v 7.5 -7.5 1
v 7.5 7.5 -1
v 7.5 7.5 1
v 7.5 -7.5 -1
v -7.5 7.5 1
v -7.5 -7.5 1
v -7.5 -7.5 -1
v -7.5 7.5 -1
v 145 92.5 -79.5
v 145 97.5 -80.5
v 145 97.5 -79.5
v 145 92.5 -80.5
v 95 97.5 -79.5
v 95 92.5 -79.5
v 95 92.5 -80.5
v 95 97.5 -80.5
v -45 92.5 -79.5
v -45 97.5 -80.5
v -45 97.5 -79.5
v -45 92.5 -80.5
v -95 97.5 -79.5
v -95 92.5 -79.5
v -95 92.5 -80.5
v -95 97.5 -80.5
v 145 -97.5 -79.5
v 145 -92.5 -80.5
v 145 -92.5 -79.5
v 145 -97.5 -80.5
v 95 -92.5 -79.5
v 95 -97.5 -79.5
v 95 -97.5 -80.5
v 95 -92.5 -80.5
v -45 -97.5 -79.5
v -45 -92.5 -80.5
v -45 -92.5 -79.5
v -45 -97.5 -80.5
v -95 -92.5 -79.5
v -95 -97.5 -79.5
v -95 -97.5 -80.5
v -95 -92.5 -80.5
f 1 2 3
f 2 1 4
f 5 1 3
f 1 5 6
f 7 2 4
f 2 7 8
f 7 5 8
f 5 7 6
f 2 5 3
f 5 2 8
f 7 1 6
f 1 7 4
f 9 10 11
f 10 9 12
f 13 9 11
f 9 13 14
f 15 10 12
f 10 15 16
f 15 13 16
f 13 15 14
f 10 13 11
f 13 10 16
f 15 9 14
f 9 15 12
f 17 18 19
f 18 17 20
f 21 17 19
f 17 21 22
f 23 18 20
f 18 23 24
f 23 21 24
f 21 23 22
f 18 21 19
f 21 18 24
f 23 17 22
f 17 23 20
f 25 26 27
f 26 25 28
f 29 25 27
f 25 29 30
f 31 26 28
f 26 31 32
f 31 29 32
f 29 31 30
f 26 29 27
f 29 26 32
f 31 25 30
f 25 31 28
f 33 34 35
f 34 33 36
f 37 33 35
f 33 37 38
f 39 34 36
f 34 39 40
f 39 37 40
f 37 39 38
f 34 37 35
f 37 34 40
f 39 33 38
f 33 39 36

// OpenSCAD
// file: single_leg.scad
include<colors.scad>;
include<parameters.scad>;
include<for_diagrams.scad>;



x = 80+20*$t;
y = 10-50*$t;
z = 90-20*$t;

i = sqrt(x*x + y*y);
u = i - L1;
n = sqrt((u)*(u) + z*z);
a1 = acos((z*z+n*n-u*u) / (2*z*n));
a2 = acos((n*n+L2*L2-L3*L3) / (2*n*L2));

alpha = atan(x/y);
beta = a1 + a2;
gamma = acos((L2*L2+L3*L3-n*n) / (2*L2*L3));

echo("alpha: ", alpha);
echo("beta: ", beta);
echo("gamma: ", gamma);

distance_x(red);
distance_y(green);
distance_z(blue);
distance_i();
distance_n(grey);
if(y<0)
	single_leg([alpha+180,beta,gamma], brown, purple, orange);
else
	single_leg([alpha,beta,gamma], brown, purple, orange);



module single_leg(angles, color1, color2, color3) {
    rotate([0,0,90-angles[0]]) {
        leg_part(L1, color1, "L", "1");                      // leg part 1
        translate([L1,0,0]) rotate([0,90-angles[1],0]) {
            leg_part(L2, color2, "L", "2");                  // leg part 2
            translate([L2,0,0]) rotate([0,180-angles[2],0]) {
                leg_part(L3, color3, "L", "3");              // leg part 3
            }
        }
    }
}

module leg_part(length, color, label1, label2) {
    translate([length/2, 0, 0]) color(color) 
    if (SHOW_LABEL) 
        d_length_t2(length, label1, label2); 
    else 
        cube([length, 1, 1], true);
}

module distance_x(color) {
    translate([(x)/2,y,-z]) rotate([0,0,0]) color(color)
    d_length_t1(x,"X");
}
module distance_y(color) {
    translate([0,y/2,-z]) rotate([0,0,90]) color(color)
    d_length_t1(y,"Y");
}
module distance_z(color){
    translate([0,0,-z/2]) rotate([0,-90,90]) color(color)
    d_length_t1(z,"Z");
}
module distance_i(color){
    rotate([0,0,90-alpha]) translate([(i)/2,0,-z]) color(color)
    d_length_t1(i,"u");
}
module distance_n(color){
    rotate([0,0,90-alpha]) translate([L1,0,0]) rotate([0,90-a1,0]) translate([n/2,0,0]) rotate([90,0,0]) color(color)
    d_length_t1(n,"n");
}
// file: for_diagrams.scad
include<bitmap.scad>;

scale=1;
res=50;

module d_vector(length, label){
	union(){
		cube([length,scale,1],center=true);
		translate([length/2,0,0]){
			rotate([0,0,45])cube([scale,scale,1],center=true);
			rotate([0,0,45])translate([-scale*3/2,0,0])cube([scale*3,scale,1],center=true);
			rotate([0,0,-45])translate([-scale*3/2,0,0])cube([scale*3,scale,1],center=true);
		}
		translate([-length/2,0,0]){
			cylinder(r=scale,h=1,center=true,$fn=res);
		}
		rotate([0,0,-90])
			translate([-scale*2-scale,-scale*2,0])
				8bit_str(["v",label], 2, scale, 1);
	}
}

module d_length_t1(length, label1){
	union(){
		cube([length,scale,1],center=true);
		translate([length/2,0,0]){
			cube([scale,scale*6,1],center=true);
		}
		translate([-length/2,0,0]){
			cube([scale,scale*6,1],center=true);
		}
		rotate([0,0,-90])
			translate([-scale*6,0,0])
				8bit_str([label1], 1, scale, 1);
	}
}

module d_length_t2(length, label1, label2){
	union(){
		cube([length,scale,1],center=true);
		translate([length/2,0,0]){
			cube([scale,scale*6,1],center=true);
		}
		translate([-length/2,0,0]){
			cube([scale,scale*6,1],center=true);
		}
		rotate([0,0,-90])
			translate([-scale*6,-scale*2,0])
				8bit_str([label1, label2], 2, scale, 1);
	}
}

//todo: Can only do 0-180 degrees. Extend to 360.
module d_angle(a,r,dir,label){
	union(){
		difference(){
			cylinder(r=r+scale/2,h=1,center=true,$fn=res);
			cylinder(r=r-scale/2,h=2,center=true,$fn=res);
			translate([0,-((r+scale/2)+1)/2,0])cube([(r+scale/2)*2+1, (r+scale/2)+1, 2],center=true);
			rotate([0,0,a])translate([0,((r+scale/2)+1)/2,0])
				cube([(r+scale/2)*2+1, (r+scale/2)+1, 2],center=true);
			if(dir==1){
				translate([(r)*cos(a),(r)*sin(a),0])rotate([0,0,a+90])
					translate([-scale/2+0.1,0,0])cube([scale,scale+1,2],center=true);
			}
			else{
				translate([r,0,0])
					translate([0,scale/2+0.1,0])cube([scale+1,scale+1,2],center=true);
			}
		}
		if(dir==1){
			translate([r,0,0])cylinder(r=scale*1.5,h=1,center=true,$fn=res);
			translate([(r)*cos(a),(r)*sin(a),0])rotate([0,0,a+90]){
				rotate([0,0,45])translate([-scale/2,scale/2,0])cube([scale,scale,1],center=true);
				rotate([0,0,45])translate([-scale*6/2,scale/2,0])cube([scale*6,scale,1],center=true);
				rotate([0,0,-45])translate([-scale*6/2,-scale/2,0])cube([scale*6,scale,1],center=true);
			}
		}
		else{
			translate([(r)*cos(a),(r)*sin(a),0])cylinder(r=scale*1.5,h=1,center=true,$fn=res);
			translate([r,0,0])rotate([0,0,-90]){
				rotate([0,0,45])translate([-scale/2,scale/2,0])cube([scale,scale,1],center=true);
				rotate([0,0,45])translate([-scale*6/2,scale/2,0])cube([scale*6,scale,1],center=true);
				rotate([0,0,-45])translate([-scale*6/2,-scale/2,0])cube([scale*6,scale,1],center=true);
			}
		}
		rotate([0,0,a/2-180])
			translate([-scale*8-r,-scale*2,0])
				8bit_str(["a",label], 2, scale, 1);
		translate([r/2,0,0])cube([r,1,1],center=true);
		rotate([0,0,a])translate([r/2,0,0])cube([r,1,1],center=true);
	}
}
// file: parameters.scad
/**
 * Robot Parameters File
 */

SHOW_LABEL = true;

center_offset = 33;   // distance from the center of robot and the first servo axis
L1 = 45;              // distance from the first servo axis and the second servo axis
L2 = 46.8;            // distance from the second servo axis and the third servo axis
L3 = 103.5;           // distance from the third servo axis and the tip of the leg
// file: colors.scad
/**
 * Color Resource File
 */

red = [1,0,0];
cyan = [0,1,1];
blue = [0,0,1];
blue_dark = [0,0,160/255];
blue_light = [173/255,216/255,230/255];
purple = [128/255,0,128/255];
yellow = [1,1,0];
lime = [0,1,0];
magenta = [1,0,1];
white = [1,1,1];
silver = [192/255,192/255,192/255];
grey = [128/255,128/255,128/255];
black = [0,0,0];
orange = [1,128/255,64/255];
brown = [165/255,42/255,42/255];
maroon = [128/255,0,0];
green = [0,128/255,0];
olive = [128/255,128/255,0];
// file: four_legs.scad
include<colors.scad>;
include<parameters.scad>;
include<for_diagrams.scad>;
use<single_leg.scad>;

X_DEFAULT = 95;
Y_DEFAULT = 95;
Z_DEFAULT = 80;

// Positions of the tips of the legs.
// leg 1
x1 = X_DEFAULT+0*$t;
y1 = Y_DEFAULT+0*$t;
z1 = Z_DEFAULT+0*$t;
// leg 2
x2 = -X_DEFAULT-0*$t;
y2 = Y_DEFAULT+0*$t;
z2 = Z_DEFAULT+0*$t;
// leg 3
x3 = -X_DEFAULT-0*$t;
y3 = -Y_DEFAULT-0*$t;
z3 = Z_DEFAULT+0*$t;
// leg 4
x4 = X_DEFAULT+0*$t;
y4 = -Y_DEFAULT-0*$t;
z4 = Z_DEFAULT-0*$t;

center_x = 10;
center_y = 0;
center_z = 0;
theta = 20+40*$t;
phi = 0;

four_legs(x1,y1,z1, x2,y2,z2, x3,y3,z3, x4,y4,z4, center_x,center_y,center_z, theta,phi);


module four_legs(x1,y1,z1, x2,y2,z2, x3,y3,z3, x4,y4,z4, center_x=0,center_y=0,center_z=0, theta=0, phi=0) {
   
    color([0,0,0]) translate([center_x,center_y,center_z]) rotate([0,0,theta+45]) cube([75,1,1], true);
    color([0,0,0]) translate([center_x,center_y,center_z]) rotate([0,0,theta+135]) cube([75,1,1], true);
    translate([center_x,center_y,center_z]) rotate([0,-phi,theta]) cube([15,15,2], true);

    x1_offset = x1 - sqrt(center_offset*center_offset/2) - center_x;
    y1_offset = y1 - sqrt(center_offset*center_offset/2) - center_y;
    z1_offset = z1 + center_z;

    x2_offset = x2 + sqrt(center_offset*center_offset/2) - center_x;
    y2_offset = y2 - sqrt(center_offset*center_offset/2) - center_y;
    z2_offset = z2+center_z;

    x3_offset = x3 + sqrt(center_offset*center_offset/2) - center_x;
    y3_offset = y3 + sqrt(center_offset*center_offset/2) - center_y;
    z3_offset = z3 + center_z;

    x4_offset = x4 - sqrt(center_offset*center_offset/2) - center_x;
    y4_offset = y4 + sqrt(center_offset*center_offset/2) - center_y;
    z4_offset = z4 + center_z;

    chord = 2*sqrt(x1*x1+y1*y1)*sin(theta/2);

    x_leg1 = cal_x_prime(x1_offset,y1_offset,45) - chord*sin(theta/2);
    y_leg1 = cal_y_prime(x1_offset,y1_offset,45) - chord*cos(theta/2);
    z_leg1 = z1_offset;

    x_leg2 = cal_x_prime(x2_offset,y2_offset,135) - chord*sin(theta/2);
    y_leg2 = cal_y_prime(x2_offset,y2_offset,135) - chord*cos(theta/2);
    z_leg2 = z2_offset;

    x_leg3 = cal_x_prime(x3_offset,y3_offset,225) - chord*sin(theta/2);
    y_leg3 = cal_y_prime(x3_offset,y3_offset,225) - chord*cos(theta/2);
    z_leg3 = z3_offset;

    x_leg4 = cal_x_prime(x4_offset,y4_offset,315) - chord*sin(theta/2);
    y_leg4 = cal_y_prime(x4_offset,y4_offset,315) - chord*cos(theta/2);
    z_leg4 = z4_offset;

    u_leg1 = sqrt(x_leg1*x_leg1 + y_leg1*y_leg1);
    n_leg1 = sqrt((u_leg1-L1)*(u_leg1-L1) + z_leg1*z_leg1);
    a1_leg1 = acos((z_leg1*z_leg1+n_leg1*n_leg1-(u_leg1-L1)*(u_leg1-L1)) / (2*z_leg1*n_leg1));
    a2_leg1 = acos((n_leg1*n_leg1+L2*L2-L3*L3) / (2*n_leg1*L2));
    a3_leg1 = acos((L2*L2+L3*L3-n_leg1*n_leg1) / (2*L2*L3));

    u_leg2 = sqrt(x_leg2*x_leg2 + y_leg2*y_leg2);
    n_leg2 = sqrt((u_leg2-L1)*(u_leg2-L1) + z_leg2*z_leg2);
    a1_leg2 = acos((z_leg2*z_leg2+n_leg2*n_leg2-(u_leg2-L1)*(u_leg2-L1)) / (2*z_leg2*n_leg2));
    a2_leg2 = acos((n_leg2*n_leg2+L2*L2-L3*L3) / (2*n_leg2*L2));
    a3_leg2 = acos((L2*L2+L3*L3-n_leg2*n_leg2) / (2*L2*L3));

    u_leg3 = sqrt(x_leg3*x_leg3 + y_leg3*y_leg3);
    n_leg3 = sqrt((u_leg3-L1)*(u_leg3-L1) + z_leg3*z_leg3);
    a1_leg3 = acos((z_leg3*z_leg3+n_leg3*n_leg3-(u_leg3-L1)*(u_leg3-L1)) / (2*z_leg3*n_leg3));
    a2_leg3 = acos((n_leg3*n_leg3+L2*L2-L3*L3) / (2*n_leg3*L2));
    a3_leg3 = acos((L2*L2+L3*L3-n_leg3*n_leg3) / (2*L2*L3));

    u_leg4 = sqrt(x_leg4*x_leg4 + y_leg4*y_leg4);
    n_leg4 = sqrt((u_leg4-L1)*(u_leg4-L1) + z_leg4*z_leg4);
    a1_leg4 = acos((z_leg4*z_leg4+n_leg4*n_leg4-(u_leg4-L1)*(u_leg4-L1)) / (2*z_leg4*n_leg4));
    a2_leg4 = acos((n_leg4*n_leg4+L2*L2-L3*L3) / (2*n_leg4*L2));
    a3_leg4 = acos((L2*L2+L3*L3-n_leg4*n_leg4) / (2*L2*L3));

    a11 = atan(x_leg1/y_leg1);
    a12 = a1_leg1 + a2_leg1;
    a13 = a3_leg1;

	echo("a11: ", a21);
	echo("a12: ", a22);
	echo("a13: ", a23);

    a21 = atan(x_leg2/y_leg2);
    a22 = a1_leg2 + a2_leg2;
    a23 = a3_leg2;

    a31 = atan(x_leg3/y_leg3);
    a32 = a1_leg3 + a2_leg3;
    a33 = a3_leg3;

    a41 = atan(x_leg4/y_leg4);
    a42 = a1_leg4 + a2_leg4;
    a43 = a3_leg4;

    translate([center_x,center_y,center_z]) {
        rotate([0,0,45+theta]) translate([center_offset,0,0]) 
		   if(y_leg1 < 0)
                single_leg([a11+180,a12,a13], lime, lime, lime);          // leg 1
            else
                single_leg([a11,a12,a13], lime, lime, lime);              // leg 1
        rotate([0,0,135+theta]) translate([center_offset,0,0]) 
		   if(y_leg2 < 0)
	            single_leg([a21+180,a22,a23], blue, blue, blue);          // leg 2
            else
	            single_leg([a21,a22,a23], blue, blue, blue);              // leg 2
        rotate([0,0,225+theta]) translate([center_offset,0,0]) 
		   if(y_leg3 < 0)
                single_leg([a31+180,a32,a33], purple, purple, purple);    // leg 3
            else
                single_leg([a31,a32,a33], purple, purple, purple);        // leg 3
        rotate([0,0,315+theta]) translate([center_offset,0,0]) 
		   if(y_leg4 < 0)
                single_leg([a41+180,a42,a43], orange, orange, orange);    // leg 4
            else
                single_leg([a41,a42,a43], orange, orange, orange);        // leg 4
    }
}

// Planar rotation (x -> x')
function cal_x_prime(x,y,angle) = x*cos(angle) + y*sin(angle);
function cal_y_prime(x,y,angle) = -x*sin(angle) + y*cos(angle);
// Planar rotation (x' -> x)
function cal_x(x_prime,y_prime,angle) = x_prime*cos(angle) - y_prime*sin(angle);
function cal_y(x_prime,y_prime,angle) = x_prime*sin(angle) + y_prime*cos(angle);
// main file
use<four_legs.scad>;

X_DEFAULT = 95;
Y_DEFAULT = 95;
Z_DEFAULT = 80;

direction = 0;
distance = 50;

walk(direction, distance);
translate([95+distance/2,95,-Z_DEFAULT]) cube([distance,5,1], true);
translate([-95+distance/2,95,-Z_DEFAULT]) cube([distance,5,1], true);
translate([95+distance/2,-95,-Z_DEFAULT]) cube([distance,5,1], true);
translate([-95+distance/2,-95,-Z_DEFAULT]) cube([distance,5,1], true);



/**
 * Walking routine. Thi is a sinusoidal gait which takes a direction and a distance as inputs. 
 * - If the distance is below the WALK_THRESHOLD only the body moves, no walking.
 * - One leg at a time is up.
 * - The robot's center of mass should be as close as possible to center of the triangle formed by the three other legs.
 * - The lifted leg sequence depends on the orientation:
 *     - <315;45>  -> 1,2,3,4
 *     - <45;135>  -> 2,3,4,1
 *     - <135;225> -> 3,4,1,2
 *     - <225;315> -> 4,1,2,3
 */
module walk(direction, distance) {
    WALK_THRESHOLD = 45;
    GAIT_AMPLITUDE = 50;
    LEG_Z_LIFT = 15;
    STEPS = 4;

    if(distance <= WALK_THRESHOLD) {
        assign (i = distance*cos(direction), 
                j = distance*sin(direction),
                k = 0,
                x1 = X_DEFAULT,y1 = Y_DEFAULT,z1 = Z_DEFAULT,
                x2 = -X_DEFAULT,y2 = Y_DEFAULT,z2 = Z_DEFAULT,
                x3 = -X_DEFAULT,y3 = -Y_DEFAULT,z3 = Z_DEFAULT,
                x4 = X_DEFAULT,y4 = -Y_DEFAULT,z4 = Z_DEFAULT) {
            translate([i,j,k]) cube([15,15,2], true);
            four_legs(x1,y1,z1, x2,y2,z2, x3,y3,z3, x4,y4,z4, i,j,k);
        }
    }
    else {
        assign (i = distance*cos(direction)*$t+cal_x($t, GAIT_AMPLITUDE*sin(360*$t+180), direction), 
                j = distance*sin(direction)*$t+cal_y($t, GAIT_AMPLITUDE*sin(360*$t+180), direction),
                k = 0) {
            translate([i,j,k]) cube([15,15,2], true);
            if(direction >= -45 && direction < 45) {    // 2,1,3,4
	            if($t > 0 && $t <= 1/STEPS) {
	                assign (
	                        x1 = X_DEFAULT,y1 = Y_DEFAULT,z1 = Z_DEFAULT,
	
	                        x2 = -X_DEFAULT+distance*cos(direction)*$t*STEPS,
	                        y2 = Y_DEFAULT+distance*sin(direction)*$t*STEPS,
	                        z2 = Z_DEFAULT-LEG_Z_LIFT*sin(180*$t*STEPS),
	
	                        x3 = -X_DEFAULT,y3 = -Y_DEFAULT,z3 = Z_DEFAULT,
	
	                        x4 = X_DEFAULT,y4 = -Y_DEFAULT,z4 = Z_DEFAULT) {
	                    four_legs(x1,y1,z1, x2,y2,z2, x3,y3,z3, x4,y4,z4, i,j,k);
	                }
	            } else if($t > 1/STEPS && $t <= 2/STEPS) {
	                assign (
	                        x1 = X_DEFAULT+distance*cos(direction)*($t-1/STEPS)*STEPS,
	                        y1 = Y_DEFAULT+distance*sin(direction)*($t-1/STEPS)*STEPS,
	                        z1 = Z_DEFAULT+LEG_Z_LIFT*sin(180*$t*STEPS),
	
	                        x2 = -X_DEFAULT+distance*cos(direction),
	                        y2 = Y_DEFAULT+distance*sin(direction),
	                        z2 = Z_DEFAULT,
	
	                        x3 = -X_DEFAULT,y3 = -Y_DEFAULT,z3 = Z_DEFAULT,
	
	                        x4 = X_DEFAULT,y4 = -Y_DEFAULT,z4 = Z_DEFAULT) {
	                    four_legs(x1,y1,z1, x2,y2,z2, x3,y3,z3, x4,y4,z4, i,j,k);
	                }
	            } else if($t > 2/STEPS && $t <= 3/STEPS) {
	                assign (
	                        x1 = X_DEFAULT+distance*cos(direction),
	                        y1 = Y_DEFAULT+distance*sin(direction),
	                        z1 = Z_DEFAULT,
	
	                        x2 = -X_DEFAULT+distance*cos(direction),
	                        y2 = Y_DEFAULT+distance*sin(direction),
	                        z2 = Z_DEFAULT,
	
	                        x3 = -X_DEFAULT+distance*cos(direction)*($t-2/STEPS)*STEPS,
	                        y3 = -Y_DEFAULT+distance*sin(direction)*($t-2/STEPS)*STEPS,
	                        z3 = Z_DEFAULT-LEG_Z_LIFT*sin(180*$t*STEPS),
	
	                        x4 = X_DEFAULT,y4 = -Y_DEFAULT,z4 = Z_DEFAULT) {
	                    four_legs(x1,y1,z1, x2,y2,z2, x3,y3,z3, x4,y4,z4, i,j,k);
	                }
	            } else if($t > 3/STEPS && $t <= 4/STEPS) {
	                assign (
	                        x1 = X_DEFAULT+distance*cos(direction),
	                        y1 = Y_DEFAULT+distance*sin(direction),
	                        z1 = Z_DEFAULT,
	
	                        x2 = -X_DEFAULT+distance*cos(direction),
	                        y2 = Y_DEFAULT+distance*sin(direction),
	                        z2 = Z_DEFAULT,
	
	                        x3 = -X_DEFAULT+distance*cos(direction),
	                        y3 = -Y_DEFAULT+distance*sin(direction),
	                        z3 = Z_DEFAULT,
	
	                        x4 = X_DEFAULT+distance*cos(direction)*($t-3/STEPS)*STEPS,
	                        y4 = -Y_DEFAULT+distance*sin(direction)*($t-3/STEPS)*STEPS,
	                        z4 = Z_DEFAULT+LEG_Z_LIFT*sin(180*$t*STEPS)) {
	                    four_legs(x1,y1,z1, x2,y2,z2, x3,y3,z3, x4,y4,z4, i,j,k);
	                }
	            }
            } else if(direction >= 45 && direction < 135) {    // 3,2,4,1
	            if($t > 0 && $t <= 1/STEPS) {
	                assign (
	                        x1 = X_DEFAULT,y1 = Y_DEFAULT,z1 = Z_DEFAULT,
	
	                        x2 = -X_DEFAULT,y2 = Y_DEFAULT,z2 = Z_DEFAULT,
	
	                        x3 = -X_DEFAULT+distance*cos(direction)*$t*STEPS,
	                        y3 = -Y_DEFAULT+distance*sin(direction)*$t*STEPS,
	                        z3 = Z_DEFAULT-LEG_Z_LIFT*sin(180*$t*STEPS),
	
	                        x4 = X_DEFAULT,y4 = -Y_DEFAULT,z4 = Z_DEFAULT) {
	                    four_legs(x1,y1,z1, x2,y2,z2, x3,y3,z3, x4,y4,z4, i,j,k);
	                }
	            } else if($t > 1/STEPS && $t <= 2/STEPS) {
	                assign (
	                        x1 = X_DEFAULT,y1 = Y_DEFAULT,z1 = Z_DEFAULT,
	
	                        x2 = -X_DEFAULT+distance*cos(direction)*($t-1/STEPS)*STEPS,
	                        y2 = Y_DEFAULT+distance*sin(direction)*($t-1/STEPS)*STEPS,
	                        z2 = Z_DEFAULT+LEG_Z_LIFT*sin(180*$t*STEPS),
	
	                        x3 = -X_DEFAULT+distance*cos(direction),
	                        y3 = -Y_DEFAULT+distance*sin(direction),
	                        z3 = Z_DEFAULT,
	
	                        x4 = X_DEFAULT,y4 = -Y_DEFAULT,z4 = Z_DEFAULT) {
	                    four_legs(x1,y1,z1, x2,y2,z2, x3,y3,z3, x4,y4,z4, i,j,k);
	                }
	            } else if($t > 2/STEPS && $t <= 3/STEPS) {
	                assign (
	                        x1 = X_DEFAULT,y1 = Y_DEFAULT,z1 = Z_DEFAULT,
	
	                        x2 = -X_DEFAULT+distance*cos(direction),
	                        y2 = Y_DEFAULT+distance*sin(direction),
	                        z2 = Z_DEFAULT,
	
	                        x3 = -X_DEFAULT+distance*cos(direction),
	                        y3 = -Y_DEFAULT+distance*sin(direction),
	                        z3 = Z_DEFAULT,
	
	                        x4 = X_DEFAULT+distance*cos(direction)*($t-2/STEPS)*STEPS,
	                        y4 = -Y_DEFAULT+distance*sin(direction)*($t-2/STEPS)*STEPS,
	                        z4 = Z_DEFAULT-LEG_Z_LIFT*sin(180*$t*STEPS)) {
	                    four_legs(x1,y1,z1, x2,y2,z2, x3,y3,z3, x4,y4,z4, i,j,k);
	                }
	            } else if($t > 3/STEPS && $t <= 4/STEPS) {
	                assign (
	                        x1 = X_DEFAULT+distance*cos(direction)*($t-3/STEPS)*STEPS,
	                        y1 = Y_DEFAULT+distance*sin(direction)*($t-3/STEPS)*STEPS,
	                        z1 = Z_DEFAULT+LEG_Z_LIFT*sin(180*$t*STEPS),
	
	                        x2 = -X_DEFAULT+distance*cos(direction),
	                        y2 = Y_DEFAULT+distance*sin(direction),
	                        z2 = Z_DEFAULT,
	
	                        x3 = -X_DEFAULT+distance*cos(direction),
	                        y3 = -Y_DEFAULT+distance*sin(direction),
	                        z3 = Z_DEFAULT,
	
	                        x4 = X_DEFAULT+distance*cos(direction),
	                        y4 = -Y_DEFAULT+distance*sin(direction),
	                        z4 = Z_DEFAULT) {
	                    four_legs(x1,y1,z1, x2,y2,z2, x3,y3,z3, x4,y4,z4, i,j,k);
	                }
	            }
            } else if(direction >= 135 && direction < 225) {    // 4,3,1,2
                if($t > 0 && $t <= 1/STEPS) {
	                assign (
	                        x1 = X_DEFAULT,y1 = Y_DEFAULT,z1 = Z_DEFAULT,
	
	                        x2 = -X_DEFAULT,y2 = Y_DEFAULT,z2 = Z_DEFAULT,
	
	                        x3 = -X_DEFAULT+distance*cos(direction)*$t*STEPS,
	                        y3 = -Y_DEFAULT+distance*sin(direction)*$t*STEPS,
	                        z3 = Z_DEFAULT-LEG_Z_LIFT*sin(180*$t*STEPS),
	
	                        x4 = X_DEFAULT,y4 = -Y_DEFAULT,z4 = Z_DEFAULT) {
	                    four_legs(x1,y1,z1, x2,y2,z2, x3,y3,z3, x4,y4,z4, i,j,k);
	                }
	            } else if($t > 1/STEPS && $t <= 2/STEPS) {
	                assign (
	                        x1 = X_DEFAULT,y1 = Y_DEFAULT,z1 = Z_DEFAULT,
	
	                        x2 = -X_DEFAULT,y2 = Y_DEFAULT,z2 = Z_DEFAULT,
	
	                        x3 = -X_DEFAULT+distance*cos(direction),
	                        y3 = -Y_DEFAULT+distance*sin(direction),
	                        z3 = Z_DEFAULT,
	
	                        x4 = X_DEFAULT+distance*cos(direction)*($t-1/STEPS)*STEPS,
	                        y4 = -Y_DEFAULT+distance*sin(direction)*($t-1/STEPS)*STEPS,
	                        z4 = Z_DEFAULT+LEG_Z_LIFT*sin(180*$t*STEPS)) {
	                    four_legs(x1,y1,z1, x2,y2,z2, x3,y3,z3, x4,y4,z4, i,j,k);
	                }
	            } else if($t > 2/STEPS && $t <= 3/STEPS) {
	                assign (
	                        x1 = X_DEFAULT+distance*cos(direction)*($t-2/STEPS)*STEPS,
	                        y1 = Y_DEFAULT+distance*sin(direction)*($t-2/STEPS)*STEPS,
	                        z1 = Z_DEFAULT-LEG_Z_LIFT*sin(180*$t*STEPS),
	
	                        x2 = -X_DEFAULT,y2 = 95,z2 = 95,
	
	                        x3 = -X_DEFAULT+distance*cos(direction),
	                        y3 = -Y_DEFAULT+distance*sin(direction),
	                        z3 = Z_DEFAULT,
	
	                        x4 = X_DEFAULT+distance*cos(direction),
	                        y4 = -Y_DEFAULT+distance*sin(direction),
	                        z4 = Z_DEFAULT) {
	                    four_legs(x1,y1,z1, x2,y2,z2, x3,y3,z3, x4,y4,z4, i,j,k);
	                }
	            } else if($t > 3/STEPS && $t <= 4/STEPS) {
	                assign (
	                        x1 = X_DEFAULT+distance*cos(direction),
	                        y1 = Y_DEFAULT+distance*sin(direction),
	                        z1 = Z_DEFAULT,
	
	                        x2 = -X_DEFAULT+distance*cos(direction)*($t-3/STEPS)*STEPS,
	                        y2 = Y_DEFAULT+distance*sin(direction)*($t-3/STEPS)*STEPS,
	                        z2 = Z_DEFAULT+LEG_Z_LIFT*sin(180*$t*STEPS),
	
	                        x3 = -X_DEFAULT+distance*cos(direction),
	                        y3 = -Y_DEFAULT+distance*sin(direction),
	                        z3 = Z_DEFAULT,
	
	                        x4 = X_DEFAULT+distance*cos(direction),
	                        y4 = -Y_DEFAULT+distance*sin(direction),
	                        z4 = Z_DEFAULT) {
	                    four_legs(x1,y1,z1, x2,y2,z2, x3,y3,z3, x4,y4,z4, i,j,k);
	                }
	            }
            } else if(direction >= 225 && direction < 315) {    // 1,4,2,3
                if($t > 0 && $t <= 1/STEPS) {
	                assign (
	                        x1 = X_DEFAULT,y1 = Y_DEFAULT,z1 = Z_DEFAULT,
	
	                        x2 = -X_DEFAULT,y2 = Y_DEFAULT,z2 = Z_DEFAULT,
	
	                        x3 = -X_DEFAULT,y3 = -Y_DEFAULT,z3 = Z_DEFAULT,
	
	                        x4 = X_DEFAULT+distance*cos(direction)*$t*STEPS,
	                        y4 = -Y_DEFAULT+distance*sin(direction)*$t*STEPS,
	                        z4 = Z_DEFAULT-LEG_Z_LIFT*sin(180*$t*STEPS)) {
	                    four_legs(x1,y1,z1, x2,y2,z2, x3,y3,z3, x4,y4,z4, i,j,k);
	                }
	            } else if($t > 1/STEPS && $t <= 2/STEPS) {
	                assign (
	                        x1 = X_DEFAULT+distance*cos(direction)*($t-1/STEPS)*STEPS,
	                        y1 = Y_DEFAULT+distance*sin(direction)*($t-1/STEPS)*STEPS,
	                        z1 = Z_DEFAULT+LEG_Z_LIFT*sin(180*$t*STEPS),
	
	                        x2 = -X_DEFAULT,y2 = Y_DEFAULT,z2 = Z_DEFAULT,
	
	                        x3 = -X_DEFAULT,y3 = -Y_DEFAULT,z3 = Z_DEFAULT,
	
	                        x4 = X_DEFAULT+distance*cos(direction),
	                        y4 = -Y_DEFAULT+distance*sin(direction),
	                        z4 = Z_DEFAULT) {
	                    four_legs(x1,y1,z1, x2,y2,z2, x3,y3,z3, x4,y4,z4, i,j,k);
	                }
	            } else if($t > 2/STEPS && $t <= 3/STEPS) {
	                assign (
	                        x1 = X_DEFAULT+distance*cos(direction),
	                        y1 = Y_DEFAULT+distance*sin(direction),
	                        z1 = Z_DEFAULT,
	
	                        x2 = -X_DEFAULT+distance*cos(direction)*($t-2/STEPS)*STEPS,
	                        y2 = Y_DEFAULT+distance*sin(direction)*($t-2/STEPS)*STEPS,
	                        z2 = Z_DEFAULT-LEG_Z_LIFT*sin(180*$t*STEPS),
	
	                        x3 = -X_DEFAULT,y3 = -Y_DEFAULT,z3 = Z_DEFAULT,
	
	                        x4 = X_DEFAULT+distance*cos(direction),
	                        y4 = -Y_DEFAULT+distance*sin(direction),
	                        z4 = Z_DEFAULT) {
	                    four_legs(x1,y1,z1, x2,y2,z2, x3,y3,z3, x4,y4,z4, i,j,k);
	                }
	            } else if($t > 3/STEPS && $t <= 4/STEPS) {
	                assign (
	                        x1 = X_DEFAULT+distance*cos(direction),
	                        y1 = Y_DEFAULT+distance*sin(direction),
	                        z1 = Z_DEFAULT,
	
	                        x2 = -X_DEFAULT+distance*cos(direction),
	                        y2 = Y_DEFAULT+distance*sin(direction),
	                        z2 = Z_DEFAULT,
	
	                        x3 = -X_DEFAULT+distance*cos(direction)*($t-3/STEPS)*STEPS,
	                        y3 = -Y_DEFAULT+distance*sin(direction)*($t-3/STEPS)*STEPS,
	                        z3 = Z_DEFAULT+LEG_Z_LIFT*sin(180*$t*STEPS),
	
	                        x4 = X_DEFAULT+distance*cos(direction),
	                        y4 = -Y_DEFAULT+distance*sin(direction),
	                        z4 = Z_DEFAULT) {
	                    four_legs(x1,y1,z1, x2,y2,z2, x3,y3,z3, x4,y4,z4, i,j,k);
	                }
	            }
            }
        }
    }
}

// Planar rotation (x' -> x)
function cal_x(x_prime,y_prime,angle) = x_prime*cos(angle) - y_prime*sin(angle);
function cal_y(x_prime,y_prime,angle) = x_prime*sin(angle) + y_prime*cos(angle);
